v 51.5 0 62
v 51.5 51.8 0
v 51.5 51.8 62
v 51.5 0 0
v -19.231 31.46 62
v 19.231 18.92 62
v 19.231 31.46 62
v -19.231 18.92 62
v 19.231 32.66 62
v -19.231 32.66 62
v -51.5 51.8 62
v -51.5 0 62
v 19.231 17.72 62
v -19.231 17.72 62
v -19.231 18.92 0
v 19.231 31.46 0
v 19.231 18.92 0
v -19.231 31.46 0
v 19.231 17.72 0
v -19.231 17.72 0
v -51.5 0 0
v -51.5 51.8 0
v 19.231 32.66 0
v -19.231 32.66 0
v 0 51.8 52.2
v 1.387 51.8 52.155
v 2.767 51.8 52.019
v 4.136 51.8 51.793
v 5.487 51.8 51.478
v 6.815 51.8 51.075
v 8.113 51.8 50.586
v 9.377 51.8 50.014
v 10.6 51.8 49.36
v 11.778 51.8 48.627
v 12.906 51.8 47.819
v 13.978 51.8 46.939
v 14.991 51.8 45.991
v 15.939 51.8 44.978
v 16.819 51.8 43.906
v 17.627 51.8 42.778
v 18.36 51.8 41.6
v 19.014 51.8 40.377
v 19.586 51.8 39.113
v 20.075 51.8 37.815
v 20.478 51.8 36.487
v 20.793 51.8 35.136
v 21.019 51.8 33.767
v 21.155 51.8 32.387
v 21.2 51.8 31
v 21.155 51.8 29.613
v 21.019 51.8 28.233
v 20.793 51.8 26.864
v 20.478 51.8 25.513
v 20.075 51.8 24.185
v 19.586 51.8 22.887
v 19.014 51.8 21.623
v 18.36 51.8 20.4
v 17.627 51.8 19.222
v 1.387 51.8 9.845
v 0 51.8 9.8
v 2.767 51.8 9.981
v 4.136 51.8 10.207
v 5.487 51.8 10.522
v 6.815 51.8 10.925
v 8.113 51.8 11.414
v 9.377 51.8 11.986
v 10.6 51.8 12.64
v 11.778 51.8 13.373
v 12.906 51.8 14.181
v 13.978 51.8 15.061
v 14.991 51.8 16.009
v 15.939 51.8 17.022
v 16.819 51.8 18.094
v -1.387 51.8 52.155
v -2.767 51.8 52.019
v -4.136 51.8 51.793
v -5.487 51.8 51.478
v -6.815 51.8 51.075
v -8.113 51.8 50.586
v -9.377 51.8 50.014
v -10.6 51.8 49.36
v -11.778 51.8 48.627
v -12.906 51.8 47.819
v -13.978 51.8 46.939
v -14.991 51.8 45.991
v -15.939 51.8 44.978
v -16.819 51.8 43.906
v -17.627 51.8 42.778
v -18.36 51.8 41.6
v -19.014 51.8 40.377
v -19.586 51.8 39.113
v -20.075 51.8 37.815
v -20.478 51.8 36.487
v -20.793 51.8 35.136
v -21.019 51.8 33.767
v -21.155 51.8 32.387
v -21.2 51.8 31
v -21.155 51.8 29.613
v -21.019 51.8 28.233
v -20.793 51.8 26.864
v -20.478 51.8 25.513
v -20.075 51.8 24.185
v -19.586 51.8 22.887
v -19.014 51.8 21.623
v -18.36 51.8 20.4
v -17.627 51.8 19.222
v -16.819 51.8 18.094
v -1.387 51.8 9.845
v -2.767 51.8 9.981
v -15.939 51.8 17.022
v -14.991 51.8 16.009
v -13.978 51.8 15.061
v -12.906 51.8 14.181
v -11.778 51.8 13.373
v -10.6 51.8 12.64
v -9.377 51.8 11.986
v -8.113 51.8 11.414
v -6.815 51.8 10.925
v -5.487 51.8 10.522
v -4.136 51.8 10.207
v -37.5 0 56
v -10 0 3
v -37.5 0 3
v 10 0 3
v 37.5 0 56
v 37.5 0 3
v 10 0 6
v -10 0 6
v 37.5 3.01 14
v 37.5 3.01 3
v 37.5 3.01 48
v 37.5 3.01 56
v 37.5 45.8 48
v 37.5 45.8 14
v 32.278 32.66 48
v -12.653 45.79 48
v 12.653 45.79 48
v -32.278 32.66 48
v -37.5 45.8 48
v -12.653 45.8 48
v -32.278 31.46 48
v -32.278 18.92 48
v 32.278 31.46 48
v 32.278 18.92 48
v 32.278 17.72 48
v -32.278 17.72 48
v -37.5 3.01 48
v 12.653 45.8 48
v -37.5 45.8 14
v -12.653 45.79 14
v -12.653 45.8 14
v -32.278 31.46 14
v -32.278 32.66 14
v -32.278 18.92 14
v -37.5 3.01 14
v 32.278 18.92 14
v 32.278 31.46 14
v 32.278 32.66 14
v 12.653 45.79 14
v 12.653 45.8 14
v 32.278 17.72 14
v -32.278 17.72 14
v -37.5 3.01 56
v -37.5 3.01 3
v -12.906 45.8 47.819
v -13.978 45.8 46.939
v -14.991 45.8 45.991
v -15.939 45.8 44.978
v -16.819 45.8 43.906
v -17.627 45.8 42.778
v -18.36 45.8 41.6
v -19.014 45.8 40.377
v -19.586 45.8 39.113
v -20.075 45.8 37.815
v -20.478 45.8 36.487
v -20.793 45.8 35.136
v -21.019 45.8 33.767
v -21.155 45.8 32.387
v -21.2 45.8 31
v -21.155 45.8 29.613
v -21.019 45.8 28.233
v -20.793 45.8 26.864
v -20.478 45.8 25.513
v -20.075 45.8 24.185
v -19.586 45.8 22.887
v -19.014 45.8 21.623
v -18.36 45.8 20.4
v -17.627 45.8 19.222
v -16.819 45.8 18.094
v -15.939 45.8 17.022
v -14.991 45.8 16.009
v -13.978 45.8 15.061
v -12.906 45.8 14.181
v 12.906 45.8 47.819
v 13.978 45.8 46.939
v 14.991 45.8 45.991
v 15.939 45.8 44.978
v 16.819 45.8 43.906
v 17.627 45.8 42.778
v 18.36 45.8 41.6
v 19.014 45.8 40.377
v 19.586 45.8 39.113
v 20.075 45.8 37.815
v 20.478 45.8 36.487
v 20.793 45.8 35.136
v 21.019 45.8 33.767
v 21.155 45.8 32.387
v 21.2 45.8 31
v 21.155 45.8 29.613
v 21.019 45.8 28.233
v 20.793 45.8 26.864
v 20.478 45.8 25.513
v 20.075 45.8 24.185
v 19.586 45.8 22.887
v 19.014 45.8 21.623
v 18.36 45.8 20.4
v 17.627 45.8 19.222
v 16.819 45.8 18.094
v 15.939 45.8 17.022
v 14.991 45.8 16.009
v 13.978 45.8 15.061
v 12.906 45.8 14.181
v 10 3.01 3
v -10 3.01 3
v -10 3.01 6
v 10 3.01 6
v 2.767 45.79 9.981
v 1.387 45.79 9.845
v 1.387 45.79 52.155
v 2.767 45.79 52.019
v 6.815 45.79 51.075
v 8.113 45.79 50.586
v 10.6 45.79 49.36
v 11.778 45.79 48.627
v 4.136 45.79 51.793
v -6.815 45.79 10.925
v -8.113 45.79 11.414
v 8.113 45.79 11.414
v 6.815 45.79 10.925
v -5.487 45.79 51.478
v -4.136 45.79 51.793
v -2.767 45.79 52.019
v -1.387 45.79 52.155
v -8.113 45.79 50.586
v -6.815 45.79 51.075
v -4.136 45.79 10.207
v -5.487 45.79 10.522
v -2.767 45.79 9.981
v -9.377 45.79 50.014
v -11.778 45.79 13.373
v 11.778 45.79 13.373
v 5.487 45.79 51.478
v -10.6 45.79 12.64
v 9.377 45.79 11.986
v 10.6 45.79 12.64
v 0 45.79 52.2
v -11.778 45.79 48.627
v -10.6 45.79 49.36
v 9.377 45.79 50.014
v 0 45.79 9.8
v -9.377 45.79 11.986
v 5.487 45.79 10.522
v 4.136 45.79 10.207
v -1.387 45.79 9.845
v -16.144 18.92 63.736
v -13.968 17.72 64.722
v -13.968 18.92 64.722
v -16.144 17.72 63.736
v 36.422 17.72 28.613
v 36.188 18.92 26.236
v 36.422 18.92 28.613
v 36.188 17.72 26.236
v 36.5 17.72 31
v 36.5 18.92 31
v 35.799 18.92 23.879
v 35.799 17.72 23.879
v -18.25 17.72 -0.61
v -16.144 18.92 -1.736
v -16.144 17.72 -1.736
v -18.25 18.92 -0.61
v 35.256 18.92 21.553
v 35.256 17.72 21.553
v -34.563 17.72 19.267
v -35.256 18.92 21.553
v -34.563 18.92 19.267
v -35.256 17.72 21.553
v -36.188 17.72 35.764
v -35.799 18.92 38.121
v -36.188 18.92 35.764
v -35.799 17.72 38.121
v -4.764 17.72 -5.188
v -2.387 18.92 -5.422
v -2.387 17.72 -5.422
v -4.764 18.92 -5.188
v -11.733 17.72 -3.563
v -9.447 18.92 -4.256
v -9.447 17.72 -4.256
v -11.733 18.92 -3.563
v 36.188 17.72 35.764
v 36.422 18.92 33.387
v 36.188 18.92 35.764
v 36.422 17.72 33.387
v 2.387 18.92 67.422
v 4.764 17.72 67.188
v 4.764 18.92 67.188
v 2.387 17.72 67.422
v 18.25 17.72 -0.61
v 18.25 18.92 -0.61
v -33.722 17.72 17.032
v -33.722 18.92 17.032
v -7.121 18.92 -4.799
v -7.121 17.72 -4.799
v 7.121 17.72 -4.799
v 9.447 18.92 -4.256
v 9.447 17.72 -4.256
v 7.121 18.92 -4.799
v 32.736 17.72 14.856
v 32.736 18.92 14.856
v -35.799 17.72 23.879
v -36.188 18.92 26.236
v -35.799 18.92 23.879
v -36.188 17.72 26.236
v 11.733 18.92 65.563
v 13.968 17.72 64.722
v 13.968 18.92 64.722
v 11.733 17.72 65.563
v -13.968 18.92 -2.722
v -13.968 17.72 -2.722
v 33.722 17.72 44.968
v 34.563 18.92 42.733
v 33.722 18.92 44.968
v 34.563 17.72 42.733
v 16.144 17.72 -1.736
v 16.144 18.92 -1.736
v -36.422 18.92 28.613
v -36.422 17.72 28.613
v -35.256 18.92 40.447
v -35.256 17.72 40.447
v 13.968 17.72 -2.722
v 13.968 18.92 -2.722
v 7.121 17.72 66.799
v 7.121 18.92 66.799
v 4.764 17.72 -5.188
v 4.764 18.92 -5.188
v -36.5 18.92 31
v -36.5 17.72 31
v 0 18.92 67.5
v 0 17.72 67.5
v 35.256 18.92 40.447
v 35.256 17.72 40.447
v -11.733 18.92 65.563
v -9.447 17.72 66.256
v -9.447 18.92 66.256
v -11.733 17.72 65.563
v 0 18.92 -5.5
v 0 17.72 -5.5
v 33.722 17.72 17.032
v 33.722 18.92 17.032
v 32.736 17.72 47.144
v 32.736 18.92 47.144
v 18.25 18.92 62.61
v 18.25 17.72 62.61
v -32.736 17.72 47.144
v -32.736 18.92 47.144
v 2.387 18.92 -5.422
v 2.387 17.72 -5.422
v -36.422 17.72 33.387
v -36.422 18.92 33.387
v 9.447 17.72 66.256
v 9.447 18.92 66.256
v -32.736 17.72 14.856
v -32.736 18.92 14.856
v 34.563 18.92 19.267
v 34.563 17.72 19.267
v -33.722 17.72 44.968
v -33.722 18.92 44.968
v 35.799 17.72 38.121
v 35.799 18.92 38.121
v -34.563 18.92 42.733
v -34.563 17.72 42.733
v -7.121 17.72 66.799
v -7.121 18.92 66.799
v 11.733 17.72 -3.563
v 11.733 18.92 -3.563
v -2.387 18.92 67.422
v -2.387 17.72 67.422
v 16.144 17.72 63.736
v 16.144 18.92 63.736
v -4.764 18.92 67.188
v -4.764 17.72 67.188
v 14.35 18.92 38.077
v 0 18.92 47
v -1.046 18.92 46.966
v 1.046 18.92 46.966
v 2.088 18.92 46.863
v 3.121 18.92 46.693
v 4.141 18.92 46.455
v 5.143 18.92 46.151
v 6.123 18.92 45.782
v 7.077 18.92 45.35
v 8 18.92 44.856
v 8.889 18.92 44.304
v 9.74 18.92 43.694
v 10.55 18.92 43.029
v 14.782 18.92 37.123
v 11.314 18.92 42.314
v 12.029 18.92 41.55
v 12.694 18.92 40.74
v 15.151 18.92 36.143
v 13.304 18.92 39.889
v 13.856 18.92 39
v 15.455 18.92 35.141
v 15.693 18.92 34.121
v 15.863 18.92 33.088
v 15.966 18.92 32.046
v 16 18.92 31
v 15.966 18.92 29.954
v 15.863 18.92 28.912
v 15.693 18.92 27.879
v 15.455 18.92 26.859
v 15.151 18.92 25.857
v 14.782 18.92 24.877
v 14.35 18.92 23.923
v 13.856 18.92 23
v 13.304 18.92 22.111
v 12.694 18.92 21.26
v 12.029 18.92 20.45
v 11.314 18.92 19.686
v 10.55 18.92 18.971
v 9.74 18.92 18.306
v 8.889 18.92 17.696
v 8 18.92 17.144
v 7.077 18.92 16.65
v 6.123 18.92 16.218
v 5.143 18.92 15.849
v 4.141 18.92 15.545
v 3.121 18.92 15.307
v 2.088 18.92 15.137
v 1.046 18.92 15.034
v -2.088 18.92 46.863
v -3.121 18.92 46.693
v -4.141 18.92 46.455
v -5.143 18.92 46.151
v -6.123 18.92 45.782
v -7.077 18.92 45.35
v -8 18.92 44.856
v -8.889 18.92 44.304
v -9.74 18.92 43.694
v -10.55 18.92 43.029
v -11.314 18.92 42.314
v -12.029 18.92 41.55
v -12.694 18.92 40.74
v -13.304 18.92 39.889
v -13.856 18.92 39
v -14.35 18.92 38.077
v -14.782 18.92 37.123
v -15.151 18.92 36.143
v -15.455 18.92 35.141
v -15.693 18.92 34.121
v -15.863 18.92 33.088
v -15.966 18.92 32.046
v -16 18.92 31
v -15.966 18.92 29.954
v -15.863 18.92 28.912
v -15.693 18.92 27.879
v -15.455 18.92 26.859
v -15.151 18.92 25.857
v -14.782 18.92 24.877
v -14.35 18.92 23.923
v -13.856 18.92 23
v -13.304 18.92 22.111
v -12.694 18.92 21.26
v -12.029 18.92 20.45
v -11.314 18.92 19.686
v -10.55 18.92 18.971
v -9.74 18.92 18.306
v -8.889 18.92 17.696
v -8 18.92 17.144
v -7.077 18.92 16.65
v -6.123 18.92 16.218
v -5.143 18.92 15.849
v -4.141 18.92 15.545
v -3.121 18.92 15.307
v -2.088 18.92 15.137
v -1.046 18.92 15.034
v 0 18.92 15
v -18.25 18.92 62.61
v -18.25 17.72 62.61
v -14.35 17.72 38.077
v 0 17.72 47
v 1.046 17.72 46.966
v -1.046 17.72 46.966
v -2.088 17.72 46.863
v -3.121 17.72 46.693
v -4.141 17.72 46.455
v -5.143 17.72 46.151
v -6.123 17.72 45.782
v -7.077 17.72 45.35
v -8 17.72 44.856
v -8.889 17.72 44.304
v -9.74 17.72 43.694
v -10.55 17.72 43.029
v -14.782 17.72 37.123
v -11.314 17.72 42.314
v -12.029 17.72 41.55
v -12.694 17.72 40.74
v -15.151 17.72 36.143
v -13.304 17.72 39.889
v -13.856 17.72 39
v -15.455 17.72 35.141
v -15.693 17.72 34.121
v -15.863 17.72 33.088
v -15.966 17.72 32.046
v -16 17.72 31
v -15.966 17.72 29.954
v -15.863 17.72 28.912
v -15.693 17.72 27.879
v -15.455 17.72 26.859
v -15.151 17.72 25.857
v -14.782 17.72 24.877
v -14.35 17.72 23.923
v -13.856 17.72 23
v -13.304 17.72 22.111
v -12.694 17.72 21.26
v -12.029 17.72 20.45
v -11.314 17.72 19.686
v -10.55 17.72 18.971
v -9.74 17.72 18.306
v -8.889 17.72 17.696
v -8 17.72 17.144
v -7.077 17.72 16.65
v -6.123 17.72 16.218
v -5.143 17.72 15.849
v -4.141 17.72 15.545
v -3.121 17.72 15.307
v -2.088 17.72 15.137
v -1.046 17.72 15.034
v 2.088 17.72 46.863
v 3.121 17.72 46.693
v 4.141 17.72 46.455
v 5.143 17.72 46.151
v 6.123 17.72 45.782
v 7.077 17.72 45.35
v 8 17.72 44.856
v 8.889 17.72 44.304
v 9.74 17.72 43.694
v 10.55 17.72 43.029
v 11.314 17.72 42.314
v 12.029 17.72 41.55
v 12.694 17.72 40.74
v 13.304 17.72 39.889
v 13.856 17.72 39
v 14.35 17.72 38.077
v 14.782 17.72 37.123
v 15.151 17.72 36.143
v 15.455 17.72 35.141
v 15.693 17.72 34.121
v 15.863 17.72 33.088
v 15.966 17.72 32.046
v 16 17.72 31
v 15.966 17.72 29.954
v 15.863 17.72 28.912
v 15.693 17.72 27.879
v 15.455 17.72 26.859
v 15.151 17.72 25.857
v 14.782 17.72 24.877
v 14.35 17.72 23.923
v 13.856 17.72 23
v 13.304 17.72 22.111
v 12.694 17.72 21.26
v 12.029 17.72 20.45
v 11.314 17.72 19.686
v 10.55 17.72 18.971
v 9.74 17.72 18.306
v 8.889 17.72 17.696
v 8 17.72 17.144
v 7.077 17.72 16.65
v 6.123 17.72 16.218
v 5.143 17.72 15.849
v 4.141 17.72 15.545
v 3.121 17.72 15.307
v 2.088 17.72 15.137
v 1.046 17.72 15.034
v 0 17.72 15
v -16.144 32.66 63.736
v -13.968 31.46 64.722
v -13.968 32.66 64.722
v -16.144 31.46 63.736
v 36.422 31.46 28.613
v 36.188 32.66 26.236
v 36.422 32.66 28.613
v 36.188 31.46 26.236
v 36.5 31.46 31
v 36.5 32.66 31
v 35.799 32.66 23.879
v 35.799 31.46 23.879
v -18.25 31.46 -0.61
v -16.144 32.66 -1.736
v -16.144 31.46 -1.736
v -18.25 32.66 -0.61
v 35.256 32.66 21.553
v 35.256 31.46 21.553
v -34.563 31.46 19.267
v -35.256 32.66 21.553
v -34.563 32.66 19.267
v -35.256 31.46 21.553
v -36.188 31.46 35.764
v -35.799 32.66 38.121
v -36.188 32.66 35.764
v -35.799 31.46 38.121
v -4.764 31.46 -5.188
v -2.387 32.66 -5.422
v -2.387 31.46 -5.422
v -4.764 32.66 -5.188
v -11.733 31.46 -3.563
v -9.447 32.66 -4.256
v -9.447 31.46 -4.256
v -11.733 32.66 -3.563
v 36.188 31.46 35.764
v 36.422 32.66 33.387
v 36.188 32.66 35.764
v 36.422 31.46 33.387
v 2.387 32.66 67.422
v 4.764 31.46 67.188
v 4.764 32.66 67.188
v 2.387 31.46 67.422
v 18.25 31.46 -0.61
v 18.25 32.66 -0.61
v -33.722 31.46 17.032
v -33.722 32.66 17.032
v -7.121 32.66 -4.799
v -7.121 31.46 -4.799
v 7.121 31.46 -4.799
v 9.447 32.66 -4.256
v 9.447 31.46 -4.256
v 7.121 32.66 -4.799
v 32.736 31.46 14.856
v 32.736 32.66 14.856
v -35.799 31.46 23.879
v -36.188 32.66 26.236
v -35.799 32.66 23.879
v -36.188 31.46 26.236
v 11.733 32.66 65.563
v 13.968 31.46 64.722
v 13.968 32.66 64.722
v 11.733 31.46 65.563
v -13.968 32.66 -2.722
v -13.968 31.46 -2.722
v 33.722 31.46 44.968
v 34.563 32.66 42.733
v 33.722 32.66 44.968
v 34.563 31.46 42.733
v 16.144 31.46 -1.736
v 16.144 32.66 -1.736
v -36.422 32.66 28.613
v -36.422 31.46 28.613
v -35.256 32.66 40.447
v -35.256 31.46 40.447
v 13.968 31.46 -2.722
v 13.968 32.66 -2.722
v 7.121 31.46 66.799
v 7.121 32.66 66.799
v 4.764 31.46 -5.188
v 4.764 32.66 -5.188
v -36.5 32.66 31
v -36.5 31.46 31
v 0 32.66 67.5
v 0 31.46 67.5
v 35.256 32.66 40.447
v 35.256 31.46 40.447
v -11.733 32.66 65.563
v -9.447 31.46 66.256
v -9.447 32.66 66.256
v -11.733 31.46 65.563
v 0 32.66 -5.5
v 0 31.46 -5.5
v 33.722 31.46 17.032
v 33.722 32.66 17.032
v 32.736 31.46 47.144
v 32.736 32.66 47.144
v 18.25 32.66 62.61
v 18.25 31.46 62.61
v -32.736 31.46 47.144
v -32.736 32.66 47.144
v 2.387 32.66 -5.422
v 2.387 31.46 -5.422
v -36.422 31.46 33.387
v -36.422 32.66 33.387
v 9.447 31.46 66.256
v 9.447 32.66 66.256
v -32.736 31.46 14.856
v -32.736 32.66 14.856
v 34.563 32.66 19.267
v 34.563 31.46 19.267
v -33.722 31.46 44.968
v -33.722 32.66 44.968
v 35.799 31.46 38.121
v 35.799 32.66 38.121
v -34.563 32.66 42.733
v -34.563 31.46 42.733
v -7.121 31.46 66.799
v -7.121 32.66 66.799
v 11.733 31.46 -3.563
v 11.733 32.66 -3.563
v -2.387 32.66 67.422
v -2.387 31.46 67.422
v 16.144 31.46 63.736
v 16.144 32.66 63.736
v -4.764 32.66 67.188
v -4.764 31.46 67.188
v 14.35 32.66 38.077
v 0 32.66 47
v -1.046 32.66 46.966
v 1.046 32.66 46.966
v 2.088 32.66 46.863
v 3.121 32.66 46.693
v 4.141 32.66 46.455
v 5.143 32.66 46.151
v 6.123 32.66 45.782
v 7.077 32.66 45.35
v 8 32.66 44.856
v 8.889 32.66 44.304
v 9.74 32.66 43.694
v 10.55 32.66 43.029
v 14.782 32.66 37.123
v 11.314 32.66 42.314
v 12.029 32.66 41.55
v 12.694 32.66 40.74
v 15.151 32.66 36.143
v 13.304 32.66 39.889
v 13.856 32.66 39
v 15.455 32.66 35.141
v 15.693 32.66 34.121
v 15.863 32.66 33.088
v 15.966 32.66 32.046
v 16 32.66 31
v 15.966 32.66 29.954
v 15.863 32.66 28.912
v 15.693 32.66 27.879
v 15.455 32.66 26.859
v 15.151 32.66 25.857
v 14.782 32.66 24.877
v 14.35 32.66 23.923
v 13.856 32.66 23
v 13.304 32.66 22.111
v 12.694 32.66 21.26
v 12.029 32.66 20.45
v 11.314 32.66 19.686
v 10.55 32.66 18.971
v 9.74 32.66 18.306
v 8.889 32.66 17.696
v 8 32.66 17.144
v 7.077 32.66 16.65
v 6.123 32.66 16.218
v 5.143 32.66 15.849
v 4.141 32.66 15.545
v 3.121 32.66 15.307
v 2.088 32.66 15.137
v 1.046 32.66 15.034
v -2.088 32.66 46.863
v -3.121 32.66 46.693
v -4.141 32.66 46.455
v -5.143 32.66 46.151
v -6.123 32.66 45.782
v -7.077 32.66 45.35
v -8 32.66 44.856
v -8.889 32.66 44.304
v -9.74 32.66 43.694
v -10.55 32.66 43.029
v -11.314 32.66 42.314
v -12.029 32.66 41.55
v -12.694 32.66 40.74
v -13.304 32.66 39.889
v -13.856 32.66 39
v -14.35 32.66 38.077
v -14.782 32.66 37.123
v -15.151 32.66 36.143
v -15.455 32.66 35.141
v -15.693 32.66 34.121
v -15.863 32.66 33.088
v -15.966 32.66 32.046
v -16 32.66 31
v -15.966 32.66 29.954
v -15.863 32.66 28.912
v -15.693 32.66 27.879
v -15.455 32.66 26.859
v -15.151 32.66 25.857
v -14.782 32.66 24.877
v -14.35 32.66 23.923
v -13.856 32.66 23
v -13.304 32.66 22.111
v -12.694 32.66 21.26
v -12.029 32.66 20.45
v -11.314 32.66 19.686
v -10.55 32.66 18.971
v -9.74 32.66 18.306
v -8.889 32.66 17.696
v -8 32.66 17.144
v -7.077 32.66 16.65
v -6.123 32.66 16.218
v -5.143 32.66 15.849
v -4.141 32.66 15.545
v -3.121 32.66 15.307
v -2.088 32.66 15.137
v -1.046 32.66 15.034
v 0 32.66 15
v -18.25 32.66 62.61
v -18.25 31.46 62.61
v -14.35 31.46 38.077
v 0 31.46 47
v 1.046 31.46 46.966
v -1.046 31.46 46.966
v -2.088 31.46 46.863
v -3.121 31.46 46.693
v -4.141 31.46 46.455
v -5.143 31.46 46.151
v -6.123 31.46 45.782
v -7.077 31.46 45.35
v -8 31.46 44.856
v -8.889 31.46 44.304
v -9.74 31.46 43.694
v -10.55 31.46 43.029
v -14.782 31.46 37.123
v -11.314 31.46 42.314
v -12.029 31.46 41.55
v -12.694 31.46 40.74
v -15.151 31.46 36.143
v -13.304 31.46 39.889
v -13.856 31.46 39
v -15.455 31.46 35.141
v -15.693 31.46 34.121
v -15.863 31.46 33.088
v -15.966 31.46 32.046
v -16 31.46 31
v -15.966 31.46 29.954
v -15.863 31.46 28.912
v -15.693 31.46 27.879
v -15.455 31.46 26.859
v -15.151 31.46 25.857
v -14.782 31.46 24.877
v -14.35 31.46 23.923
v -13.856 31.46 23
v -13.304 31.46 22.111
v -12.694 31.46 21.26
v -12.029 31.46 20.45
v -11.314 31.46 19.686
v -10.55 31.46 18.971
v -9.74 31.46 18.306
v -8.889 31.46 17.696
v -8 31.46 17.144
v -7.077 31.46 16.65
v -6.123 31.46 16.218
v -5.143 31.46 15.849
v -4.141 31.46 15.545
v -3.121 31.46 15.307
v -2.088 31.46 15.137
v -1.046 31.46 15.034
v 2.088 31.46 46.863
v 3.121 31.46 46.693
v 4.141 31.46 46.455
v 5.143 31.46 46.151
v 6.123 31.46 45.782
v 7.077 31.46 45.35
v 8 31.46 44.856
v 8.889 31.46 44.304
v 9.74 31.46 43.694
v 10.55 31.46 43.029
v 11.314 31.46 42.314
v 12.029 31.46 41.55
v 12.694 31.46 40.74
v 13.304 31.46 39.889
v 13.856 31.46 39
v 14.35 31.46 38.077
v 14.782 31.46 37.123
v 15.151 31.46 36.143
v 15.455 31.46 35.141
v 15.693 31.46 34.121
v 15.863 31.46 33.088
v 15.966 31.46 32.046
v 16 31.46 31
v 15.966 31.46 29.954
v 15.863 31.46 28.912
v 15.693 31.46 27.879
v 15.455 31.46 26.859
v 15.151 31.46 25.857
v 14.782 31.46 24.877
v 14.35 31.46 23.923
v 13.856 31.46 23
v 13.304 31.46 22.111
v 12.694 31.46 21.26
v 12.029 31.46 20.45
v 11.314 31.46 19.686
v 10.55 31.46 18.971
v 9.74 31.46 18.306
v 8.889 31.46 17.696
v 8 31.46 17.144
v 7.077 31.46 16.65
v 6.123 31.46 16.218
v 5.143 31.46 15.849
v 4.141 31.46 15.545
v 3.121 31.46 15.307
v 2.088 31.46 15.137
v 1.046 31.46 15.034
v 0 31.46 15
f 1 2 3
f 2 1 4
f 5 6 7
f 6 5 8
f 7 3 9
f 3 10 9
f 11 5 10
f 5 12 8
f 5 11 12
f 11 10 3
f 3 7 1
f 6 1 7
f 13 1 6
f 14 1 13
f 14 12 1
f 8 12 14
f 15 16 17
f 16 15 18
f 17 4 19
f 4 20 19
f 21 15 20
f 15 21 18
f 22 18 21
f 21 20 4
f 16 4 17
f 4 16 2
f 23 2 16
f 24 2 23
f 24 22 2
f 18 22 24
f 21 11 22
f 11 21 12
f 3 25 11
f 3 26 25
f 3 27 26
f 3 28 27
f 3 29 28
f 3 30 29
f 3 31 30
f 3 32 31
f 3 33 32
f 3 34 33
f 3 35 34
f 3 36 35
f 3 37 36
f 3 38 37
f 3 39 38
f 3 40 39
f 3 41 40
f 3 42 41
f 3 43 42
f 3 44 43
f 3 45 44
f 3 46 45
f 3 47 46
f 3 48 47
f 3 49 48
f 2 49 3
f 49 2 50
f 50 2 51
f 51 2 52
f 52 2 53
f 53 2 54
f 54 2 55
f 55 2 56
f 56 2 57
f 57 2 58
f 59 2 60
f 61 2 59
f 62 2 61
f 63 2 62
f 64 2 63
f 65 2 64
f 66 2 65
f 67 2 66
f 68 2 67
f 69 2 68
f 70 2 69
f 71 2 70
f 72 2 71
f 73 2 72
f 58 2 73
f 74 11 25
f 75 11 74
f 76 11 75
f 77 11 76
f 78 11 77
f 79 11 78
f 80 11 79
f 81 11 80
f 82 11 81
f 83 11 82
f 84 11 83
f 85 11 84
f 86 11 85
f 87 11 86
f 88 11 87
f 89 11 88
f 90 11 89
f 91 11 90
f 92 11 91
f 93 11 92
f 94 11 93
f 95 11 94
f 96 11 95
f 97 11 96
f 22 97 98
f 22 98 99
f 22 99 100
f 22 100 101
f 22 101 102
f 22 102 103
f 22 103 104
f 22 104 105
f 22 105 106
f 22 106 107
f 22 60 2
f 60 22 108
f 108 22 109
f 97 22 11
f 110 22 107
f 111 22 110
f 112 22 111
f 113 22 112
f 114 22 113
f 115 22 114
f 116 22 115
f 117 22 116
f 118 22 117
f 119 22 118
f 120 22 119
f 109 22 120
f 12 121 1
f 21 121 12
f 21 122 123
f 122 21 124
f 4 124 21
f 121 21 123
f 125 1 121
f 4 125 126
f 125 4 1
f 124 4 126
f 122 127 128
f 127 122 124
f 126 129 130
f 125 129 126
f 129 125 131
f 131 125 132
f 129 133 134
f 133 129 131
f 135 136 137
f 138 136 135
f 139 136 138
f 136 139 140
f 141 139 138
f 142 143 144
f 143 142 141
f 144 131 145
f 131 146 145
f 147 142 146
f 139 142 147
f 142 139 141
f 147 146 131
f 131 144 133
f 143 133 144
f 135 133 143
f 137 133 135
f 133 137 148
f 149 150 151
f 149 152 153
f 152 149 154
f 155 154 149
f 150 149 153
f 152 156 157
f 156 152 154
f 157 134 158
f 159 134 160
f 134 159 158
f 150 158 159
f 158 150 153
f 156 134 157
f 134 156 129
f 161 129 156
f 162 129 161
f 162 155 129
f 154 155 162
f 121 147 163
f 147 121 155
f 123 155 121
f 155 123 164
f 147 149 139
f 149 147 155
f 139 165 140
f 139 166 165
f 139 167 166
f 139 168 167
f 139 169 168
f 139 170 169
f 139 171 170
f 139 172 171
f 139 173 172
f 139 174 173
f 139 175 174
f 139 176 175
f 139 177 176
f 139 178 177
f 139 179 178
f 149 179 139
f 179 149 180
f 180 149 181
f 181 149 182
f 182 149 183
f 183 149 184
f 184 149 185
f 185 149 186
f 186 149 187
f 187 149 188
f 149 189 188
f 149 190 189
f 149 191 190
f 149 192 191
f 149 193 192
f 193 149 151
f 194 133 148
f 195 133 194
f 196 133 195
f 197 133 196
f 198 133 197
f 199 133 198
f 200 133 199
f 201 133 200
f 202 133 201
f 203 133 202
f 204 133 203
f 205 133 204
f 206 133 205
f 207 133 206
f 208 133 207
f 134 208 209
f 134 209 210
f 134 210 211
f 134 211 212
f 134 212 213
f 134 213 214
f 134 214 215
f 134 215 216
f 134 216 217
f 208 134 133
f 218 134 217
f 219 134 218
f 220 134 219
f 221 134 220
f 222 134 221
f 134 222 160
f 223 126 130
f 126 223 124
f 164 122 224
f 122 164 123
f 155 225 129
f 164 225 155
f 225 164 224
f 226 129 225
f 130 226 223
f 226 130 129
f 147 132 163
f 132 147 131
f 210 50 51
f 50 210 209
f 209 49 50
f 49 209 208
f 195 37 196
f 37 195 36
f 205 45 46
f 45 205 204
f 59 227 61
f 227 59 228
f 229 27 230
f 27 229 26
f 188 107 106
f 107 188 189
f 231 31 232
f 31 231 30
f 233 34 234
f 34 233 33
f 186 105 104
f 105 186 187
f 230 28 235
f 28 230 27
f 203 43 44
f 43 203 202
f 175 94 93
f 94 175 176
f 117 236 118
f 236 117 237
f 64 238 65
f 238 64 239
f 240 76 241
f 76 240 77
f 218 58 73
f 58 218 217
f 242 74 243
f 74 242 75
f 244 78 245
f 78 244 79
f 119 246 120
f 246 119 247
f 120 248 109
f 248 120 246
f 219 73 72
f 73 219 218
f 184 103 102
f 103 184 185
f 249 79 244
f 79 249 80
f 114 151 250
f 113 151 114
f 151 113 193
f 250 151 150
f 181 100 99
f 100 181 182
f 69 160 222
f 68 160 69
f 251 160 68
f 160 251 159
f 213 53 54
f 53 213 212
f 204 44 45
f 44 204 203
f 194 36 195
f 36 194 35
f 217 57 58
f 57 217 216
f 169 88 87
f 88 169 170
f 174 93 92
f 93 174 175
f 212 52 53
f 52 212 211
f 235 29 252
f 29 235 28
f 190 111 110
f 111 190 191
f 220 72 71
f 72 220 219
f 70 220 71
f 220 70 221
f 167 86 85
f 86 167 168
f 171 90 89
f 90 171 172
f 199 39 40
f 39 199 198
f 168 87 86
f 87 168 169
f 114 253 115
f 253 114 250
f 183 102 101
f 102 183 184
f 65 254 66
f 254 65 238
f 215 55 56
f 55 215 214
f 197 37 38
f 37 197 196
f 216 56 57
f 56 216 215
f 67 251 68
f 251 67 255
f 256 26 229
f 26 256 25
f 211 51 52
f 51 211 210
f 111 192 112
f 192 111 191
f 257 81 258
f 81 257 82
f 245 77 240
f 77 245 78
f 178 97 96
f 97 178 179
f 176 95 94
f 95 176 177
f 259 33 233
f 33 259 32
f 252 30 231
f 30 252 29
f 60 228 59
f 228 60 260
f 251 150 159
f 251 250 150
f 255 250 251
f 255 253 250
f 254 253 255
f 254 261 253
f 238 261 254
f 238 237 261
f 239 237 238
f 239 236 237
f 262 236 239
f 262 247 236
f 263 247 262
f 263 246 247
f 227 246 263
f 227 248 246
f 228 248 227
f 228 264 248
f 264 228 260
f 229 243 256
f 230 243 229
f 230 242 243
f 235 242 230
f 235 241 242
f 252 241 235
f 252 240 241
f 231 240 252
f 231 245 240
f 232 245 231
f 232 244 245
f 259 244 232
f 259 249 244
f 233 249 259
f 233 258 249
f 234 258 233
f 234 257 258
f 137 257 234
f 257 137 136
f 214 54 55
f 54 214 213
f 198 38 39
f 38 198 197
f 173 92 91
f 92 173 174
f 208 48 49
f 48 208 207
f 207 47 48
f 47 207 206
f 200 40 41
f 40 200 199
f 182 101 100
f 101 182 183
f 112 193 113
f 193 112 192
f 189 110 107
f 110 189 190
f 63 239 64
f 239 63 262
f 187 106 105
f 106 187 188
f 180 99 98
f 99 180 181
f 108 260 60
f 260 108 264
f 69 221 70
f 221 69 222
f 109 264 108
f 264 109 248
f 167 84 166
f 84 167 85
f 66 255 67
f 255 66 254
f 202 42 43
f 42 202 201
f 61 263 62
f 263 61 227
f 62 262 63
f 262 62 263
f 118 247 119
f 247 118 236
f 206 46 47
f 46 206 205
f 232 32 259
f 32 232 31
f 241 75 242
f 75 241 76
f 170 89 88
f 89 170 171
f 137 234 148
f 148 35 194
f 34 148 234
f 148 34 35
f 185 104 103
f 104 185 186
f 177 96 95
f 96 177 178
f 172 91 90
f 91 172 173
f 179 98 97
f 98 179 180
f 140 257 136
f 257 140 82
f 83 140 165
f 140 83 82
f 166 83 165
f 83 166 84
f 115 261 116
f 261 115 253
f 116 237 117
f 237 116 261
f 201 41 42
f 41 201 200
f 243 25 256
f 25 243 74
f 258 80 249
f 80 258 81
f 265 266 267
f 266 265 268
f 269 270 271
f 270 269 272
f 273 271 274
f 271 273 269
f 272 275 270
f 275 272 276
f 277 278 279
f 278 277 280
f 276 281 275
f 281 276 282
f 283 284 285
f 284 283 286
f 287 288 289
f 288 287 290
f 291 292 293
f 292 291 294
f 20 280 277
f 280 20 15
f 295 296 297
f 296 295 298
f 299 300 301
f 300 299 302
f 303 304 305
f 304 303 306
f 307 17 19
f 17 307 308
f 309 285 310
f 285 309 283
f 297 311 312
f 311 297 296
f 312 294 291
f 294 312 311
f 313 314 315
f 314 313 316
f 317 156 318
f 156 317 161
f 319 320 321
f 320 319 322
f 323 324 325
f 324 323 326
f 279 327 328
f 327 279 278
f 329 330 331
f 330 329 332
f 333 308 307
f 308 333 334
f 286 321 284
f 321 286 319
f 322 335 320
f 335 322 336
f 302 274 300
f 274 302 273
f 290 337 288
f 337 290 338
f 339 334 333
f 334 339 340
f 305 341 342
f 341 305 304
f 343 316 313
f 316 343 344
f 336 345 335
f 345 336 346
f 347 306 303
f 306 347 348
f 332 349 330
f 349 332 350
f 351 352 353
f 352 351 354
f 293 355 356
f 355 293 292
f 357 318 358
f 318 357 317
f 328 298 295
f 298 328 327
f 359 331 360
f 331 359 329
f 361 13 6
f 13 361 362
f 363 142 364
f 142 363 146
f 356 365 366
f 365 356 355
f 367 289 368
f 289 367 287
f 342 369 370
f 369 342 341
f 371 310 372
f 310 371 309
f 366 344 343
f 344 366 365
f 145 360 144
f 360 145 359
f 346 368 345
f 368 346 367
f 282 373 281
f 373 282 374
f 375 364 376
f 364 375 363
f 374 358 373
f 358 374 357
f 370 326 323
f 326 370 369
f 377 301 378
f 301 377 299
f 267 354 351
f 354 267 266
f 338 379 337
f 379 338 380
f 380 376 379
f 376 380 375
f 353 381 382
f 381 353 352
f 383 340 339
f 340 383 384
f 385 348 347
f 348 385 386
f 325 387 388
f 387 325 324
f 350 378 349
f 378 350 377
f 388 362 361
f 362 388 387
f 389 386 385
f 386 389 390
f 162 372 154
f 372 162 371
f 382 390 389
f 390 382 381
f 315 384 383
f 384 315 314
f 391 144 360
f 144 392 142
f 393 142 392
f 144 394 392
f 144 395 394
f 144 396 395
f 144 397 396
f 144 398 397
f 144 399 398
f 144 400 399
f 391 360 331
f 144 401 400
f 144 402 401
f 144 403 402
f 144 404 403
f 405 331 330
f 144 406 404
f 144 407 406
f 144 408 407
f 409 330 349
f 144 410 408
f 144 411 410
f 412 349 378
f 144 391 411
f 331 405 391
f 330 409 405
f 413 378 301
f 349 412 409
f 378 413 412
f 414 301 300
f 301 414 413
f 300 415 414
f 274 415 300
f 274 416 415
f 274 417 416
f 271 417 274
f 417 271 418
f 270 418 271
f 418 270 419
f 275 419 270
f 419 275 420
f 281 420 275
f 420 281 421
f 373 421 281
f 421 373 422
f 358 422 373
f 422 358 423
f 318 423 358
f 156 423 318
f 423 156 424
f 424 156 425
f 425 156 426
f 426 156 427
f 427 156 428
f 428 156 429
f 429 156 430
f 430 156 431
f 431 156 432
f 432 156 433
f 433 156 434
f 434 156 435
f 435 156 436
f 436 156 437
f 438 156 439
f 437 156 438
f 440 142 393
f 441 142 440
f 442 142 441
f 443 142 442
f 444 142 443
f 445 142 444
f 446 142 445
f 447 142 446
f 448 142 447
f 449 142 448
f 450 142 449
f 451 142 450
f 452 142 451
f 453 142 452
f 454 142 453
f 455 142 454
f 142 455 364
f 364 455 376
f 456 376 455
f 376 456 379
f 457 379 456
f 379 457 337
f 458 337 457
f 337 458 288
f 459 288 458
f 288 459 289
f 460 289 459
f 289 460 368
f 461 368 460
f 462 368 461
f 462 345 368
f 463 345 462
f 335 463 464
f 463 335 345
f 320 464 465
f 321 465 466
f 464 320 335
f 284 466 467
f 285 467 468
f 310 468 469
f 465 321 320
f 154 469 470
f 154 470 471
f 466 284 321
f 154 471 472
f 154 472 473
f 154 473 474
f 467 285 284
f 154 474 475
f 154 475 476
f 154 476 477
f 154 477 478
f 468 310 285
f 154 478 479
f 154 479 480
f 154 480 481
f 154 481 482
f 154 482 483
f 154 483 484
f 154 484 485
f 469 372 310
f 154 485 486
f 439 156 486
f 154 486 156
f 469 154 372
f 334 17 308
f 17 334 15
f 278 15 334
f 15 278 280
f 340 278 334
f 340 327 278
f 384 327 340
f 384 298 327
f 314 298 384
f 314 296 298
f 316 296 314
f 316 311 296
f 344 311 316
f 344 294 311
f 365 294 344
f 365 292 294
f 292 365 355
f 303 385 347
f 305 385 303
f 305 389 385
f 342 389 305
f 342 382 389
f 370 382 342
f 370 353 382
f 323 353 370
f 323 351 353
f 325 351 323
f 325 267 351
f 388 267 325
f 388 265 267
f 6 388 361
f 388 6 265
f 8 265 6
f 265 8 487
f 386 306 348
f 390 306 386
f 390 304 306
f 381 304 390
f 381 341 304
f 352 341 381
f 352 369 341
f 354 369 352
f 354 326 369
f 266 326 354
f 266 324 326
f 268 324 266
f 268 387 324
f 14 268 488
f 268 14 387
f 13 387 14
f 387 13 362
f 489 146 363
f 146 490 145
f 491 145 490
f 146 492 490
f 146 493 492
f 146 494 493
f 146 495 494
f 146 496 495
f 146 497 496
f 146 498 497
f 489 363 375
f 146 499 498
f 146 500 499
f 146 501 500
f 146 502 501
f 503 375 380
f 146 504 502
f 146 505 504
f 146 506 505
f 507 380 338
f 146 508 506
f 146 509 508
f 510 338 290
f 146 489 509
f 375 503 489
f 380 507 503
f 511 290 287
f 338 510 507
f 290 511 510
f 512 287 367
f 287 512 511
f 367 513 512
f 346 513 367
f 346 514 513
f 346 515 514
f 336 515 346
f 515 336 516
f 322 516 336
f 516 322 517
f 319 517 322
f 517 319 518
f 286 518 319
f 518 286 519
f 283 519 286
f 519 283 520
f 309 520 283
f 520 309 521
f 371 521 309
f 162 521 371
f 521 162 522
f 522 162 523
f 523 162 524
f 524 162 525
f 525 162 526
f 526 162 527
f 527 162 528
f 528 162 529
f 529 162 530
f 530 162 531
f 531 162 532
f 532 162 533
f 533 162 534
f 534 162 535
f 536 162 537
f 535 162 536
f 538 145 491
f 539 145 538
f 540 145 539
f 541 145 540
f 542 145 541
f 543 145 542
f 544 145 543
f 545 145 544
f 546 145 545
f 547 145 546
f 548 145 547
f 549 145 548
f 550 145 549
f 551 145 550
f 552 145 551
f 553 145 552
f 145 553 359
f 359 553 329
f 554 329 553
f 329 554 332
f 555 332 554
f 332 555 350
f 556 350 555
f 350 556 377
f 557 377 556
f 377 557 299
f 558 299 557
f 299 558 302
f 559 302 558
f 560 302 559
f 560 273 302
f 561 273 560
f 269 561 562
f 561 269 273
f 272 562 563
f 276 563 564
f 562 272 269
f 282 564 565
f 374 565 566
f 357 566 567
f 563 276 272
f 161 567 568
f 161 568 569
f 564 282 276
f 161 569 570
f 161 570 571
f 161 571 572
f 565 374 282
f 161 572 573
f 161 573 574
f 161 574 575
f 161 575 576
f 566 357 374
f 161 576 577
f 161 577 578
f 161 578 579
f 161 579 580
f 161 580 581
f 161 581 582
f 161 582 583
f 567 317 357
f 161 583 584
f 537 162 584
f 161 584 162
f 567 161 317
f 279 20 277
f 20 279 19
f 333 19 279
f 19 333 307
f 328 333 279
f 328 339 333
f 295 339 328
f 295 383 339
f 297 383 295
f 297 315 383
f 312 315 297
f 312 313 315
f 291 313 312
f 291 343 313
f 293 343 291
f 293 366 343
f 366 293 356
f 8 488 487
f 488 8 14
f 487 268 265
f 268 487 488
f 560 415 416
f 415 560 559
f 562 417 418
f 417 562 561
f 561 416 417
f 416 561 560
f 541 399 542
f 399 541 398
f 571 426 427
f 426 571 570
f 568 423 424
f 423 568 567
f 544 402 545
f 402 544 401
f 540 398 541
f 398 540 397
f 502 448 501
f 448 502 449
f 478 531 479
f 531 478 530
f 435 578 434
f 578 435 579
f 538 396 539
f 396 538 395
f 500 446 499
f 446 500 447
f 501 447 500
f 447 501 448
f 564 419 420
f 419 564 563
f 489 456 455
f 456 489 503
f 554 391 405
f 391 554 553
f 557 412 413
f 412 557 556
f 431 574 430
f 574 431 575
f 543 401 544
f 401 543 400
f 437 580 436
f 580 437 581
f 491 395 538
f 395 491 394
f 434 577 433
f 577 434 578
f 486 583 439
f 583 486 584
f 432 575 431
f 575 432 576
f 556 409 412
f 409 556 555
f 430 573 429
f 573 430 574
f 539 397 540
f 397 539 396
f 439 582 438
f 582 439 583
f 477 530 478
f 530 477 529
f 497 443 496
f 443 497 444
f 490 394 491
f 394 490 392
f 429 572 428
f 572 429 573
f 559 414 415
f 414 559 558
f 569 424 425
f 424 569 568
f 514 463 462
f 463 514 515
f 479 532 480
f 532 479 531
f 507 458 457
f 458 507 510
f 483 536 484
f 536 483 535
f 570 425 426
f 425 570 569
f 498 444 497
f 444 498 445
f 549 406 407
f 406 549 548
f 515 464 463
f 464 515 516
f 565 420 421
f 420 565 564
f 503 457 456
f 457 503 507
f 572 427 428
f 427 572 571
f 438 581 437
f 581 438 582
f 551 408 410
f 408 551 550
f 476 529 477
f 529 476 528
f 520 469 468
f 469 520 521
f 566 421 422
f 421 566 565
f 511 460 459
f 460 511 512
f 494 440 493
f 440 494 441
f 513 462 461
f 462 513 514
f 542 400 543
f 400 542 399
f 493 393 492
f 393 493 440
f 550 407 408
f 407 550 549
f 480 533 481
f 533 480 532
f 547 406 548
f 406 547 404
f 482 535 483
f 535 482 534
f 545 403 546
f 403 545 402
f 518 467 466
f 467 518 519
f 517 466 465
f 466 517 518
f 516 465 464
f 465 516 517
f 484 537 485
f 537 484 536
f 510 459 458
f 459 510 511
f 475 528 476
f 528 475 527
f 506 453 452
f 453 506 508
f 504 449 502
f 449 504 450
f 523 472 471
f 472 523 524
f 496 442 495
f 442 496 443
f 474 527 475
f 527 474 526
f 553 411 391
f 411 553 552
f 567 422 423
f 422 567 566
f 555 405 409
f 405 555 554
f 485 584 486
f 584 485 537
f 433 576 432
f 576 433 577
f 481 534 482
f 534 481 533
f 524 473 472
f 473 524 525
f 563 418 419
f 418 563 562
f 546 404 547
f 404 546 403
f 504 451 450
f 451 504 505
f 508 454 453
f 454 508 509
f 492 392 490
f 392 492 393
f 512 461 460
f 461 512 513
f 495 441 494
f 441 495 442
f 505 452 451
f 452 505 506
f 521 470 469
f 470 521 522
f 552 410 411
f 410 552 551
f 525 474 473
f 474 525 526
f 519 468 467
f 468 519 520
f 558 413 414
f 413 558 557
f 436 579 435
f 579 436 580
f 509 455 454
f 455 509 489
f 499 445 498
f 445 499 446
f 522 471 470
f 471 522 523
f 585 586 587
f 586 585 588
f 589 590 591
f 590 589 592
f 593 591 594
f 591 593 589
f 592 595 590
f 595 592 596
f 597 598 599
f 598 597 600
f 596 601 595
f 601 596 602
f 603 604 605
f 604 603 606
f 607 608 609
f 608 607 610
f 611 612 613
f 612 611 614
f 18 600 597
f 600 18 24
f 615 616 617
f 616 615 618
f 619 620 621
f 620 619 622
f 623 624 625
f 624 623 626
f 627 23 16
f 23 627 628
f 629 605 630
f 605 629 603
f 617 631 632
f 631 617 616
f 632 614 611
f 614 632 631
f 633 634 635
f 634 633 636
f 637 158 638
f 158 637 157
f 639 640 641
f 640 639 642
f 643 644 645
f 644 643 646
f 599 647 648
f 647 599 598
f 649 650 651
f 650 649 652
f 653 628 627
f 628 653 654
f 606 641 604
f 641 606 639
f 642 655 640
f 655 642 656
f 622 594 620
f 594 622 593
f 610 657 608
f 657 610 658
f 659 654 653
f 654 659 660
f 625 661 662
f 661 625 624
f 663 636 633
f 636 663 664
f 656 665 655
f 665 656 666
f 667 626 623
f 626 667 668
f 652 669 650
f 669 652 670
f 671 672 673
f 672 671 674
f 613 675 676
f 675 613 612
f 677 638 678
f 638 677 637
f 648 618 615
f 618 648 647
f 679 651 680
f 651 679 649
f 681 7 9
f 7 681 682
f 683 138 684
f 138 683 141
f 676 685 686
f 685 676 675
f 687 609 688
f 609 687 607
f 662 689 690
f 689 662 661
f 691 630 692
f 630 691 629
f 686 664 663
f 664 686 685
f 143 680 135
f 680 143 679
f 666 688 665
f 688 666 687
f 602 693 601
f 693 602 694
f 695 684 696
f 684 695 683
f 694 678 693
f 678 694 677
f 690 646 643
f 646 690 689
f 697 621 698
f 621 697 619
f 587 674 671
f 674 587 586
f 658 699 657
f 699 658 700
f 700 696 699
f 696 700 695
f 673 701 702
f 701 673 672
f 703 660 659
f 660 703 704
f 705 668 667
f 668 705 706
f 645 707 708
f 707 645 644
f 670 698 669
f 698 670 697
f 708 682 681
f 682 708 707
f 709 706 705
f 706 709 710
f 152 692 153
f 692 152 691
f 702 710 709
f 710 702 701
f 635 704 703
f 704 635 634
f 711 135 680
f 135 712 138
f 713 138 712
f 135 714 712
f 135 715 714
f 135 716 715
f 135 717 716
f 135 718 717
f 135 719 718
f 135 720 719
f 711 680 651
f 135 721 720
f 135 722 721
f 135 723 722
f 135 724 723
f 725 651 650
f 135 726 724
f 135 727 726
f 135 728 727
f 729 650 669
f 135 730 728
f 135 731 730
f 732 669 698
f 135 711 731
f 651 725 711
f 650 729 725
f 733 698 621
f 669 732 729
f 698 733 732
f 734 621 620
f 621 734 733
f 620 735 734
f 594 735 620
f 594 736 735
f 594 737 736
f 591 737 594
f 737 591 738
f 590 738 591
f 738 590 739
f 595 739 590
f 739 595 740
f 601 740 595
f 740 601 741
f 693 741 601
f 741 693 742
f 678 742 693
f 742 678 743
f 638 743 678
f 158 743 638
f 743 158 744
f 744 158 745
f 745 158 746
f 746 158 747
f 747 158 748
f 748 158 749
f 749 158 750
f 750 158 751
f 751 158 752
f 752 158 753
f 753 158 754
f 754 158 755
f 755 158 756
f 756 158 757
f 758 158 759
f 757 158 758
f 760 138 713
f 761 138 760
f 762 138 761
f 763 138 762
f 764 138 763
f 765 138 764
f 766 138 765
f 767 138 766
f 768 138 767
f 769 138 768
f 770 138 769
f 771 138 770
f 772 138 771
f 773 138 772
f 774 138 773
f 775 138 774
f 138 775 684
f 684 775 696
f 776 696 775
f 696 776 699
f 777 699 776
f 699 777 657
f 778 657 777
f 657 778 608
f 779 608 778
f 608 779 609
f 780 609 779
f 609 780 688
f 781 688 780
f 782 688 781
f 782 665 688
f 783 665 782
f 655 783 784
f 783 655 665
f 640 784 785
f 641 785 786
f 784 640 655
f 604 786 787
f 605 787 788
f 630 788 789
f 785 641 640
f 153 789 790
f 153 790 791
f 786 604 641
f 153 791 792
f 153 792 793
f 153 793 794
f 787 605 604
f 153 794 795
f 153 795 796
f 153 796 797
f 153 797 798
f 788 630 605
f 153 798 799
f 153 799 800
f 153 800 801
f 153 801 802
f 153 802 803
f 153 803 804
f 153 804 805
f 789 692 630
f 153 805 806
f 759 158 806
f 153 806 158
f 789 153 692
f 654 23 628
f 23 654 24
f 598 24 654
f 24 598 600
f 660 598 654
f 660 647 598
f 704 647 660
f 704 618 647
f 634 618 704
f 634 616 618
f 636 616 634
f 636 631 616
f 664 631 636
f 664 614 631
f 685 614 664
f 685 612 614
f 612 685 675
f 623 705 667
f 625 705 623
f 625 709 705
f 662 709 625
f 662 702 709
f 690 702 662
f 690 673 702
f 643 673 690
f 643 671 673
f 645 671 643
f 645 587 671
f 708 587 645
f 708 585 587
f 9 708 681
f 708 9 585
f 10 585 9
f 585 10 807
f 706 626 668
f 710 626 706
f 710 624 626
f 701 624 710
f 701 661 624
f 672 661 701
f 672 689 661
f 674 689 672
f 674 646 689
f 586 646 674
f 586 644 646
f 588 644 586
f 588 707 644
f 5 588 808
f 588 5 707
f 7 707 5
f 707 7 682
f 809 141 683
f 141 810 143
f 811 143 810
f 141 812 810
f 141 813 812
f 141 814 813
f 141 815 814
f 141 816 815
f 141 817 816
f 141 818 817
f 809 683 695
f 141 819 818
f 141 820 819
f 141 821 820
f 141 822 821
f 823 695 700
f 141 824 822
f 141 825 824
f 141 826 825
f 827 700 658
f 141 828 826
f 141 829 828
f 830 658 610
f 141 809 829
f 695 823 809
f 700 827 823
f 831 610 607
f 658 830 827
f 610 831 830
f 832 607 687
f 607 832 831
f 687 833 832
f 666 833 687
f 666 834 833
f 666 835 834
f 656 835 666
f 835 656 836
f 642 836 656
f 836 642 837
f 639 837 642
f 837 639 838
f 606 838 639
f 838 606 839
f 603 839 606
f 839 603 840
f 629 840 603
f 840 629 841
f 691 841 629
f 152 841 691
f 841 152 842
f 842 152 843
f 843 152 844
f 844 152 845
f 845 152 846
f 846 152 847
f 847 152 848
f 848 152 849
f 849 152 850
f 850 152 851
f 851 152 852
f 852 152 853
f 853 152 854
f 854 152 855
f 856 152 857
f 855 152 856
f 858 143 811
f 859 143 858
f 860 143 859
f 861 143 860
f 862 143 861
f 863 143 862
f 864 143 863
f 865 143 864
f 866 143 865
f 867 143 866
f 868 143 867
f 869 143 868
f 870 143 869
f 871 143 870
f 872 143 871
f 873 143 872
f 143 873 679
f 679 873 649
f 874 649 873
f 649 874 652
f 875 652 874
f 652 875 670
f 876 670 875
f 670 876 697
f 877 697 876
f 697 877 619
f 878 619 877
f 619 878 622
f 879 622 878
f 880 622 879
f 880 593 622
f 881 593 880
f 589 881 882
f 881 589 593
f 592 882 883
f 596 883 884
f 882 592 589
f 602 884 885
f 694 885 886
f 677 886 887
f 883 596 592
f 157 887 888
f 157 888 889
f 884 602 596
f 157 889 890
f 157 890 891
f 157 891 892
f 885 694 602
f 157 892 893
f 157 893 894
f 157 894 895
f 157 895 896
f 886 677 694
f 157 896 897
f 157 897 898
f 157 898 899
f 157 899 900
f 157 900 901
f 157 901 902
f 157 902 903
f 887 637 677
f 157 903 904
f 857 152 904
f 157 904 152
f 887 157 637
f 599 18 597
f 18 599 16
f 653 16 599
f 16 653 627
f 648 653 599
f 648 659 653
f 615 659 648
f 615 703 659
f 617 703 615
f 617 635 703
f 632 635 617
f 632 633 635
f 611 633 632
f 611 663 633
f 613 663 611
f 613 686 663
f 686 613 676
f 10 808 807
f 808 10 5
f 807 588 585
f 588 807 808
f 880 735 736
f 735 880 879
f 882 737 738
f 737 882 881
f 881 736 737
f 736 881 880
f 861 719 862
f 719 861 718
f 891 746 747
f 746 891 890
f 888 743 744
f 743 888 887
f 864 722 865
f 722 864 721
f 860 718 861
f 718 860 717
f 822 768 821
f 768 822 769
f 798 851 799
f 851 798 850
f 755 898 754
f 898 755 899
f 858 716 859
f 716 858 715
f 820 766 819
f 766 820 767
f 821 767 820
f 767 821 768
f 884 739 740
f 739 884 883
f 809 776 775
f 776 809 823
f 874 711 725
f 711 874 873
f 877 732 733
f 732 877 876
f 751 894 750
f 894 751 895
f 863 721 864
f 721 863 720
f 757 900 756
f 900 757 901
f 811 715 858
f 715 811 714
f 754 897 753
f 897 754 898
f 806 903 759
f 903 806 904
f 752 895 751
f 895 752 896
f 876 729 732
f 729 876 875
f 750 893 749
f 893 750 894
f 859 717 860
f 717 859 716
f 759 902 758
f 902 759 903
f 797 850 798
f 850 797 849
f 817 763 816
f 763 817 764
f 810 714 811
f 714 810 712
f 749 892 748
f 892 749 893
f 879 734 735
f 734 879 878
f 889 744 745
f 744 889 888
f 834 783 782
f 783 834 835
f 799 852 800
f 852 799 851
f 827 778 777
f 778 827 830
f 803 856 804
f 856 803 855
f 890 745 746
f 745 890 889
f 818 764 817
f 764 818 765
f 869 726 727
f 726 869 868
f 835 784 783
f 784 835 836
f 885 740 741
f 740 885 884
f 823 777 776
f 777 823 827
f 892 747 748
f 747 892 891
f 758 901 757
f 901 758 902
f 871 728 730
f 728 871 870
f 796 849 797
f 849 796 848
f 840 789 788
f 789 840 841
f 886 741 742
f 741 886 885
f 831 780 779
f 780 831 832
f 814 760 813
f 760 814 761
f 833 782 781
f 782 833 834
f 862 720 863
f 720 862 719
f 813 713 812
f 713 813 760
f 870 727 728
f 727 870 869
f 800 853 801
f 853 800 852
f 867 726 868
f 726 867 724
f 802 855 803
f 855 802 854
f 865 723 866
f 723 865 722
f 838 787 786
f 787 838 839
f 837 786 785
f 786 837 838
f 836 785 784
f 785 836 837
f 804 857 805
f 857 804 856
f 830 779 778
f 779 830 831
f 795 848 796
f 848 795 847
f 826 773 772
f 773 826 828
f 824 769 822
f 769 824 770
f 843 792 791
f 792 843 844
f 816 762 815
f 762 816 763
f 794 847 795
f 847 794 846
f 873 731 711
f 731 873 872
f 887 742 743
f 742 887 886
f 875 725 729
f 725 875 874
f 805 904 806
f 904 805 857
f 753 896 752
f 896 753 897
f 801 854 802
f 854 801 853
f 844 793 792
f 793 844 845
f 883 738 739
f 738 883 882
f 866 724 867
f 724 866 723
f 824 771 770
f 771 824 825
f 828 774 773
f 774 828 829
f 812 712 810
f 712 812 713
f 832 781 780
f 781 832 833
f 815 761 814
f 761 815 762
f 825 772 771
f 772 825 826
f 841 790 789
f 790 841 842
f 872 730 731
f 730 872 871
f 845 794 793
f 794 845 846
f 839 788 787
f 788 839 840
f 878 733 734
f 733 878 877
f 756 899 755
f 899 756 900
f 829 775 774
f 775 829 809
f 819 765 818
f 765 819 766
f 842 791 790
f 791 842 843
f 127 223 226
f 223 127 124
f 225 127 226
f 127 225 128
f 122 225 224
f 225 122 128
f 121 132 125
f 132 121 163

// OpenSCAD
// X-Pan DIY Camera - Simple Pinhole Body v01  [STARTER]
// Units: millimeters
// Coordinate system (same convention as the film back):
//   X = width (film travel direction, cartridge->take-up)
//   Y = depth, +Y is FRONT (toward the lens/pinhole module)
//   Z = height
//
// This body is a light-tight dark chamber that mounts on the shared film
// back and receives an M42 front module (pinhole or lens). It sets the
// 50mm pinhole-to-film distance.
//
// STATUS: geometrically-correct STARTER. The dark chamber, optical depth,
// and M42 register are modelled to spec. The body<->film-back hook/latch
// tabs are provisional and MUST be test-fit against the printed film back
// (they mate to the film back's top hook rail and bottom 3mm latch pin).
// The M42 is modelled as a PLAIN register bore (see m42_mode) because a
// printed thread needs per-printer tuning — cut/tap it, print a threaded
// insert, or bond an M42 adapter ring.

$fn = 96;

part = "body"; // [body, viewfinder_clip]

// ---------- Interface constants (must match film-back-v01-fixed.scad) ----------
frame_w            = 65.0;
frame_h            = 24.0;
film_w             = 35.0;
body_h             = 62.0;   // film back height; body matches it
bridge_w           = 95.0;   // film back centre bridge width (mating zone)
front_bridge_y     = 20.0;   // film back front datum (rear->front)
film_plane_y       = 15.8;   // film plane inside the film back (rear->front)
// distance from the film back FRONT mating face back to the film plane:
film_to_datum      = front_bridge_y - film_plane_y;   // = 4.2mm

hook_lip_h         = 4.0;    // film back top hook rail height
hook_lip_d         = 5.0;    // film back top hook rail +Y projection
latch_pin_d        = 3.0;    // film back bottom latch pin
latch_pin_z        = 8.0;    // pin height above film back base (approx)
latch_pin_y        = front_bridge_y + 4.0;  // pin Y (in film-back frame)

// ---------- Optical / body depth ----------
pinhole_to_film    = 50.0;
// The body rear mating face sits on the film-back front datum, which is
// film_to_datum in front of the film plane. So the pinhole plane must be
// this far in front of the body rear face:
optical_len        = pinhole_to_film - film_to_datum;   // = 45.8mm
front_plate_t      = 6.0;    // thickness of the M42 front plate
body_len_y         = optical_len + front_plate_t;        // rear face(0) -> outer front

// ---------- Body envelope ----------
wall               = 3.0;
flange_extra_w     = 4.0;    // rear flange overhangs the bridge each side for the seal
body_W             = bridge_w + 2 * flange_extra_w;       // = 103mm
body_H             = body_h;                              // = 62mm
inner_W            = frame_w + 10.0;   // chamber wider than the frame for the light cone
inner_H            = frame_h + 10.0;

// ---------- M42 front mount ----------
m42_mode           = "plain_bore"; // [plain_bore, plain_counterbore]
m42_major_d        = 42.0;   // M42x1 nominal major diameter
m42_bore_d         = 42.4;   // plain register bore (tap to M42x1, or bond adapter)
m42_depth          = front_plate_t;  // full plate depth
light_hole_d       = 26.0;   // clear light path behind the mount into the chamber

// ---------- Colours ----------
body_color = [0.32, 0.32, 0.34, 1.0];
seal_color = [0.02, 0.02, 0.02, 0.85];

module box_from_to(p0, p1) {
    translate([p0[0], p0[1], p0[2]])
        cube([p1[0] - p0[0], p1[1] - p0[1], p1[2] - p0[2]]);
}

// ---------- Main dark chamber ----------
module body_shell() {
    difference() {
        // outer solid
        box_from_to([-body_W / 2, 0, 0], [body_W / 2, body_len_y, body_H]);

        // hollow dark chamber (open at the rear, closed by the front plate)
        box_from_to([-inner_W / 2, -1, (body_H - inner_H) / 2],
                    [ inner_W / 2, body_len_y - front_plate_t, (body_H + inner_H) / 2]);

        // widen the rear opening to the full inner frame + seal rebate zone
        box_from_to([-inner_W / 2, -1, wall],
                    [ inner_W / 2, wall + 0.01, body_H - wall]);

        // light path through the front plate + M42 register bore
        translate([0, body_len_y - m42_depth - 0.01, body_H / 2])
            rotate([-90, 0, 0])
                cylinder(d = m42_bore_d, h = m42_depth + 0.02);
        translate([0, body_len_y - front_plate_t - 0.01, body_H / 2])
            rotate([-90, 0, 0])
                cylinder(d = light_hole_d, h = front_plate_t + 0.02);
    }

    // internal anti-reflection baffle rings (two shallow ribs)
    for (yb = [optical_len * 0.4, optical_len * 0.7])
        translate([0, yb, body_H / 2])
            rotate([-90, 0, 0])
                difference() {
                    cylinder(d = inner_W - 2, h = 1.2, center = true);
                    cylinder(d = light_hole_d + 6, h = 2, center = true);
                }
}

// ---------- Film-back lock features (PROVISIONAL - test fit) ----------
module lock_features() {
    // TOP hook: a downward lip on the body rear-top that drops over the film
    // back top hook rail. Rail projects +Y by hook_lip_d at the top.
    box_from_to([-bridge_w / 2 + 8, 0, body_H - hook_lip_h - 2.0],
                [ bridge_w / 2 - 8, hook_lip_d + 1.5, body_H]);
    box_from_to([-bridge_w / 2 + 8, hook_lip_d - 0.5, body_H - hook_lip_h - 6.0],
                [ bridge_w / 2 - 8, hook_lip_d + 1.5, body_H - hook_lip_h - 2.0]);

    // BOTTOM latch: a flexible hook that snaps under the film back 3mm pin.
    // Printed as a cantilever tab; tune thickness for snap force.
    difference() {
        box_from_to([-10, 0, 2.0], [10, latch_pin_y + latch_pin_d, 6.0]);
        translate([0, latch_pin_y, 4.0])
            rotate([0, 90, 0])
                cylinder(d = latch_pin_d + 0.4, h = 22, center = true);
    }
}

// ---------- Rear sealing flange face (velvet lands, not printed thick) ----------
module rear_seal_lands() {
    color(seal_color) {
        // perimeter lip around the rear opening for a velvet light seal
        difference() {
            box_from_to([-body_W / 2 + 3, 0, 3], [body_W / 2 - 3, 1.2, body_H - 3]);
            box_from_to([-inner_W / 2 - 2, -1, wall], [inner_W / 2 + 2, 2, body_H - wall]);
        }
    }
}

module simple_body() {
    color(body_color) {
        body_shell();
        lock_features();
    }
    rear_seal_lands();
}

// ---------- Optional printed viewfinder clip (holds bent-wire frame) ----------
module viewfinder_clip() {
    difference() {
        cube([14, 10, 6], center = true);
        translate([0, 0, 1]) cube([10, 12, 4], center = true);
        rotate([90, 0, 0]) cylinder(d = 1.3, h = 20, center = true); // wire hole
    }
}

if      (part == "body")           simple_body();
else if (part == "viewfinder_clip") viewfinder_clip();
else                               simple_body();
